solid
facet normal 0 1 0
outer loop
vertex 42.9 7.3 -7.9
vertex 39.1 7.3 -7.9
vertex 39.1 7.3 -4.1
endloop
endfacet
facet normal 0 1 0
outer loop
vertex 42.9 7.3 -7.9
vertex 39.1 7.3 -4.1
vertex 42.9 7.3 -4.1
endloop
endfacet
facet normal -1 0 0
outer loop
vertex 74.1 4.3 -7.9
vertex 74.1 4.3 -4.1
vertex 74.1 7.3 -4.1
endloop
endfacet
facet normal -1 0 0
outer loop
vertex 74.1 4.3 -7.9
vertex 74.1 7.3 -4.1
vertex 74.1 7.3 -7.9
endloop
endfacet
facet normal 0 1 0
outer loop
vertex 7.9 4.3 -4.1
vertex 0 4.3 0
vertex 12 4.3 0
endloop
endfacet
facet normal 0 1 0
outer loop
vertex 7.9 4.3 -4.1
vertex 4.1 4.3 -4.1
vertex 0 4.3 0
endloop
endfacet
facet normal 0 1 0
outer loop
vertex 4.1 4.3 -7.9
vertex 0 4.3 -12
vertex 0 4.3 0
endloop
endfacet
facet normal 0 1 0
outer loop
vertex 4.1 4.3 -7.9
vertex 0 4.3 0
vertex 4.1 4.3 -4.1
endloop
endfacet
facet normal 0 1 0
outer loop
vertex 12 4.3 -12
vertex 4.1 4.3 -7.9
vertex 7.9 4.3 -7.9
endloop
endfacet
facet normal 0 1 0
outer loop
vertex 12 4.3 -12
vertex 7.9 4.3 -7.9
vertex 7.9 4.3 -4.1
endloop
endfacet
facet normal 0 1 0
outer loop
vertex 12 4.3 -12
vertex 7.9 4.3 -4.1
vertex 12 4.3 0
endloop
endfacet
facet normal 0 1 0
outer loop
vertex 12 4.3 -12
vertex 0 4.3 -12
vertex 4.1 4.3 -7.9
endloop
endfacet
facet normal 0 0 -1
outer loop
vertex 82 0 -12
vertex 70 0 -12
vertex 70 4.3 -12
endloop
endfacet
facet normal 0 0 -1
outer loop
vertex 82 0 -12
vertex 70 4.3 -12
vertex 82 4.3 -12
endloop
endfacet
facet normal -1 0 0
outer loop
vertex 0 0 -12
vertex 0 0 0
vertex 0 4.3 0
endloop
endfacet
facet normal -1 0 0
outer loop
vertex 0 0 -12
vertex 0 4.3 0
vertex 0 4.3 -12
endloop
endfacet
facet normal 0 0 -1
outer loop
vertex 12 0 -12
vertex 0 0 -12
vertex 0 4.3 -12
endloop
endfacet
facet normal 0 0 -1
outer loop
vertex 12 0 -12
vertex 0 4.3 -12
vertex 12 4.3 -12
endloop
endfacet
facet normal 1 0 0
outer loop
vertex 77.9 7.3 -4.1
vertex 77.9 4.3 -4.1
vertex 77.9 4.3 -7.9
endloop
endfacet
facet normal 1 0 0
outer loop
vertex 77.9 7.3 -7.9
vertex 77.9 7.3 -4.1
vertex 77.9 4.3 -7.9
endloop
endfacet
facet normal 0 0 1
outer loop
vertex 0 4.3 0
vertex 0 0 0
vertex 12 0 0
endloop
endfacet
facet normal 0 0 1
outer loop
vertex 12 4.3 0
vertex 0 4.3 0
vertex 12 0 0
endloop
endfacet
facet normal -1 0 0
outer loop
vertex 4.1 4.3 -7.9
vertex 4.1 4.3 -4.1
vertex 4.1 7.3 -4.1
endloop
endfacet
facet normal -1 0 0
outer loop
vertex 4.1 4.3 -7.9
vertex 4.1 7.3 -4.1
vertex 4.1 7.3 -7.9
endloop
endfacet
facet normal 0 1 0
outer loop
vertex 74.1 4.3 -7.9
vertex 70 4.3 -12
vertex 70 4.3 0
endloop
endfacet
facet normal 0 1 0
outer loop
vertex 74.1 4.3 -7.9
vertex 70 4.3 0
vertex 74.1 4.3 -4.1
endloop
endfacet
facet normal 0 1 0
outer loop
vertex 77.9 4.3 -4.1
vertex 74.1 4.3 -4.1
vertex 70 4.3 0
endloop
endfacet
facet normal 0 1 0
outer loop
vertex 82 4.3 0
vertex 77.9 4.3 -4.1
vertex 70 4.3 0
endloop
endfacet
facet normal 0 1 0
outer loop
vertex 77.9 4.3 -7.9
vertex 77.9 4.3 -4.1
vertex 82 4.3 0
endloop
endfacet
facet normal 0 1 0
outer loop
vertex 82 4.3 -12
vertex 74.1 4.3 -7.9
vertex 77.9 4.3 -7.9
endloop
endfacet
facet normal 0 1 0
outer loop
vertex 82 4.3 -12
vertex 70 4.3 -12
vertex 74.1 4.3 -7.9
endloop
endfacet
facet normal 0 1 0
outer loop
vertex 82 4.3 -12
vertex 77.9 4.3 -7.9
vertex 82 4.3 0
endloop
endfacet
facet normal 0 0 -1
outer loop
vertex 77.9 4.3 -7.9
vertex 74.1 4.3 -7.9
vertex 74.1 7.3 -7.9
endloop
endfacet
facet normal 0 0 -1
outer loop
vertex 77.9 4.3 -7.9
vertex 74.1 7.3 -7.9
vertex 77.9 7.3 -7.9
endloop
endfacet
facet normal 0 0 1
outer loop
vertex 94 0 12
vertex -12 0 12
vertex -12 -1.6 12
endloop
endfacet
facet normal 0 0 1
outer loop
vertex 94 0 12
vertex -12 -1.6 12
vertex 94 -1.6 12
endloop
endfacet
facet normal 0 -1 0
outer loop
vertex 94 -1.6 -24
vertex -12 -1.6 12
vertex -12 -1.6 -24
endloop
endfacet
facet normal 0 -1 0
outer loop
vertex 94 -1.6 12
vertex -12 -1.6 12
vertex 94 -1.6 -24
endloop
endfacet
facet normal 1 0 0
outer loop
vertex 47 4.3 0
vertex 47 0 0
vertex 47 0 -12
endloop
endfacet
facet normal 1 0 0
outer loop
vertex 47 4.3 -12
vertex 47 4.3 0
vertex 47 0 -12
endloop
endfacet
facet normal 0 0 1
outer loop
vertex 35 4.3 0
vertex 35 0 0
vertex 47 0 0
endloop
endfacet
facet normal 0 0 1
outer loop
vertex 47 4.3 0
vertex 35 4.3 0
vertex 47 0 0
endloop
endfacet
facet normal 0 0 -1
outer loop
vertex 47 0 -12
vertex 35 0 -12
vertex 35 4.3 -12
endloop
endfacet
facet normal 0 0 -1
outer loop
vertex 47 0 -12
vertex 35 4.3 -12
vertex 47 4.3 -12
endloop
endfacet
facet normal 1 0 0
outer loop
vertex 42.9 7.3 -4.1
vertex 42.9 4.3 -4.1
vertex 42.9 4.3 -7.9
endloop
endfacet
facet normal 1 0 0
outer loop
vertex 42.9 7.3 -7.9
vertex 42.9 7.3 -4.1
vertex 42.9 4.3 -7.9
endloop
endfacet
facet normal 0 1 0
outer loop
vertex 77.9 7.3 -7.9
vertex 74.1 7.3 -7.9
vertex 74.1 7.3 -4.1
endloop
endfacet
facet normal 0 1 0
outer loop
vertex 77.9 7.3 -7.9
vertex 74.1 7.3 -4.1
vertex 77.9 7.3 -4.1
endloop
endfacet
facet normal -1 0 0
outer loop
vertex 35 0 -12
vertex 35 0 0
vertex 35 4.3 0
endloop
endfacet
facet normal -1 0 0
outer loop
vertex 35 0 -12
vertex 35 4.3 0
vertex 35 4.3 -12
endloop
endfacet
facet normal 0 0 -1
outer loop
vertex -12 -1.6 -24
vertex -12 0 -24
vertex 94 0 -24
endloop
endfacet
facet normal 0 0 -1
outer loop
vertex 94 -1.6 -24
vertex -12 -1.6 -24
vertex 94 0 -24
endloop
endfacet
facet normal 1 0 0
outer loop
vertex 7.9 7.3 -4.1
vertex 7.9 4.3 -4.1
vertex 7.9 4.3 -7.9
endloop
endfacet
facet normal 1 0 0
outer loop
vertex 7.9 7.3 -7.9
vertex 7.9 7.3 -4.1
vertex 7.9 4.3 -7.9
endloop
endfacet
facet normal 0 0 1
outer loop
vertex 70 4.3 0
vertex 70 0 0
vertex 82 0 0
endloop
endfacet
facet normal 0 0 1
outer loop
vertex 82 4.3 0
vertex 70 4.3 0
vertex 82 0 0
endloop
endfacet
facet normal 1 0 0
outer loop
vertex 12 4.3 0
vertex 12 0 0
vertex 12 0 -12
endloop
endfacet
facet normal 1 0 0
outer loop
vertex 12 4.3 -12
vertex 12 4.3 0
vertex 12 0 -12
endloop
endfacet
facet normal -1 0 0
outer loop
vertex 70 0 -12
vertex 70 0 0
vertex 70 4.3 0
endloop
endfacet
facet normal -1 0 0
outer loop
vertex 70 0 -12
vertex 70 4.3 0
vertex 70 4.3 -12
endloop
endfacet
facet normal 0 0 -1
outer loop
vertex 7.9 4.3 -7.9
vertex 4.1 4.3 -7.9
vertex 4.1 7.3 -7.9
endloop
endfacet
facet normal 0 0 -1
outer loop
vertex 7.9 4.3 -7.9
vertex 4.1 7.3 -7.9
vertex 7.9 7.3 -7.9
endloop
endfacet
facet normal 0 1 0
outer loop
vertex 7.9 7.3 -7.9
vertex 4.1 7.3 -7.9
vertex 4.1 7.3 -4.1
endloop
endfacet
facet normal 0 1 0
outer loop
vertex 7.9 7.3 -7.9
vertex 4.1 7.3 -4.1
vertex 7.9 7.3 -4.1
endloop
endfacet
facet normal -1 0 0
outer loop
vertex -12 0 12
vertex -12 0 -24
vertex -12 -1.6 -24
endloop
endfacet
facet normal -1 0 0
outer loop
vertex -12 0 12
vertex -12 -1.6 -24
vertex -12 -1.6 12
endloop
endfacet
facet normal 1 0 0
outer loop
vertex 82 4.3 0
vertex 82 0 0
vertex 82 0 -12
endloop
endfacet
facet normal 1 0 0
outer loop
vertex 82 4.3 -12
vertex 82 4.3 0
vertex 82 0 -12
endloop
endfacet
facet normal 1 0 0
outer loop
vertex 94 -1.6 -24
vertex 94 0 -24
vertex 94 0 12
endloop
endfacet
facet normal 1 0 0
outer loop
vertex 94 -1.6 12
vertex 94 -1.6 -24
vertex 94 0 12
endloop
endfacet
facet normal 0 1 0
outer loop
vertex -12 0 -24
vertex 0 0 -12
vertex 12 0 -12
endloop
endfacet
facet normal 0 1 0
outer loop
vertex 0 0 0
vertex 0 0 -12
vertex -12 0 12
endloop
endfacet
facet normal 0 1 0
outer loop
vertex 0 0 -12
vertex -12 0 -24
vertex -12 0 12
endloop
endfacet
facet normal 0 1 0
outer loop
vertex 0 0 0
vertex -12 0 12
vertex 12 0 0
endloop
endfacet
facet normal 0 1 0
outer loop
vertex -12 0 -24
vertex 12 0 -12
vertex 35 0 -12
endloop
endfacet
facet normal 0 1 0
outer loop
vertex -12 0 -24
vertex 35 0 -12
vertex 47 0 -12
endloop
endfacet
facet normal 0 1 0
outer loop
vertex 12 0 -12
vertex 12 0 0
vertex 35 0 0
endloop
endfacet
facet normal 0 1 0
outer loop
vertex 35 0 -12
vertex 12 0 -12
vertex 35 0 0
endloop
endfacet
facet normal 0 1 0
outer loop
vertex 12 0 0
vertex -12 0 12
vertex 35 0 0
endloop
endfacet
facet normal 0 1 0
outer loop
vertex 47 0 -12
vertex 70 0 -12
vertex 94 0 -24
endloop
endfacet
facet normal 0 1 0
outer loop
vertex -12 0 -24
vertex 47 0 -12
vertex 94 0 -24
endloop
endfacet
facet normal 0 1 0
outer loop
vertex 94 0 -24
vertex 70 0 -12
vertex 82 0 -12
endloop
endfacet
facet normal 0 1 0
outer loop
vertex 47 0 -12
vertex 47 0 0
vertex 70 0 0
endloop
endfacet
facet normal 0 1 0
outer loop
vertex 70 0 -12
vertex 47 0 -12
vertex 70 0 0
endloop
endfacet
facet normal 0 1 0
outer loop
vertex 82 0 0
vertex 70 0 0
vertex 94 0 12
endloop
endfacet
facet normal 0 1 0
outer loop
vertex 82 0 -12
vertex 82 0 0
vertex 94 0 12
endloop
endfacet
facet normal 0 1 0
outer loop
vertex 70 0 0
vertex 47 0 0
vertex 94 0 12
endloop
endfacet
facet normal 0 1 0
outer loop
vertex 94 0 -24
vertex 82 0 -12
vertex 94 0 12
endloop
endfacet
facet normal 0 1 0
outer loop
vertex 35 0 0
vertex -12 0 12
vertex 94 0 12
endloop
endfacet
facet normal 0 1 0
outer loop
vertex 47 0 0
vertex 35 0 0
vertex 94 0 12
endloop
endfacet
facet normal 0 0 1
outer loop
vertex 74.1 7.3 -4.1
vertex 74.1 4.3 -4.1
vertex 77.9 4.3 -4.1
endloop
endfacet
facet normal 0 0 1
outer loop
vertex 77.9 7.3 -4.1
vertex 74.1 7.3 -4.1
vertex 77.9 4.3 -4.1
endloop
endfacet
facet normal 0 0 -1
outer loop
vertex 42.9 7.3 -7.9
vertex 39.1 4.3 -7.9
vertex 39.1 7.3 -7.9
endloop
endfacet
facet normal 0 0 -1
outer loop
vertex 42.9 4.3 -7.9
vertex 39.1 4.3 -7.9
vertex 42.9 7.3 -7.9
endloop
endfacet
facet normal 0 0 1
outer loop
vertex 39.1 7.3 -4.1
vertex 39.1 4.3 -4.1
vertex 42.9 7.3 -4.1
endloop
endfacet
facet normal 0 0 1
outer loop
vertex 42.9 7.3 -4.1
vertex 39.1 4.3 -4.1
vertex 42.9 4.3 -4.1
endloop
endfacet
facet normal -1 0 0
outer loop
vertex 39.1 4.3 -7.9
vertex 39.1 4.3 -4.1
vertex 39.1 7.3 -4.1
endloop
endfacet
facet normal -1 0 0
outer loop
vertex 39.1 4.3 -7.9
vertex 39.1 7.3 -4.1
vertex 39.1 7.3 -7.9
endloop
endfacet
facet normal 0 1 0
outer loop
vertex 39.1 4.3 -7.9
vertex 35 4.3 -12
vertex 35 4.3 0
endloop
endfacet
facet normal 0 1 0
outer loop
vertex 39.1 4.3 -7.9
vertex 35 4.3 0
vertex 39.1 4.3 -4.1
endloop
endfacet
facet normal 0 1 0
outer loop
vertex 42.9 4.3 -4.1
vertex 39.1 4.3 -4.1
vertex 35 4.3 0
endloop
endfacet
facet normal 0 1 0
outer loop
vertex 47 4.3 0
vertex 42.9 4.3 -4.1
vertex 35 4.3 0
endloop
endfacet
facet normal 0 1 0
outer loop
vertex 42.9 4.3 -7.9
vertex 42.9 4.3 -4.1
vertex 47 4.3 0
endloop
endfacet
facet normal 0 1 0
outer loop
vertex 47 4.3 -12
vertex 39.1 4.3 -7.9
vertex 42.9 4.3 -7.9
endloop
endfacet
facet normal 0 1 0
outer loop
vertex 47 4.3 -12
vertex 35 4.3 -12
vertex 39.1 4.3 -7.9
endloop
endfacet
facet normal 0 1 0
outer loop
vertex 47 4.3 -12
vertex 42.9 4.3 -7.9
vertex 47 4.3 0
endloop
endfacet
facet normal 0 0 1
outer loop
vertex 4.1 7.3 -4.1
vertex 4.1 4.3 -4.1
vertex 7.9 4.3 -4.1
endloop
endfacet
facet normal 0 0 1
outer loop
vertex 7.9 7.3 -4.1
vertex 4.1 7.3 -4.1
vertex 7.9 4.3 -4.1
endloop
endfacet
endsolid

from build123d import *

# Parameters (mm, degrees)
SKETCH1_W           = 12
SKETCH1_H           = 12
BOSS_EXTRUDE1_DEPTH = 4.3
SKETCH2_W           = 3.8
SKETCH2_H           = 3.8
BOSS_EXTRUDE2_DEPTH = 3
SKETCH3_W           = 106
SKETCH3_H           = 36
BOSS_EXTRUDE3_DEPTH = 1.6
SKETCH4_W           = 12
SKETCH4_H           = 12
BOSS_EXTRUDE4_DEPTH = 4.3
SKETCH5_W           = 3.8
SKETCH5_H           = 3.8
BOSS_EXTRUDE5_DEPTH = 3


with BuildPart() as part:
    # Sketch1 → Boss-Extrude1 (new body)
    with BuildSketch(Plane(origin=(0, 0, 0), x_dir=(1, 0, 0), z_dir=(0, 1, 0))):
        with Locations((6, 6)):
            Rectangle(SKETCH1_W, SKETCH1_H)
    extrude(amount=BOSS_EXTRUDE1_DEPTH)

    # Sketch2 → Boss-Extrude2 (add)
    with BuildSketch(Plane(origin=(0, 4.3, 0), x_dir=(1, 0, 0), z_dir=(0, 1, 0))):
        with Locations((6, 6)):
            Rectangle(SKETCH2_W, SKETCH2_H)
    extrude(amount=BOSS_EXTRUDE2_DEPTH)

    # Sketch3 → Boss-Extrude3 (add)
    with BuildSketch(Plane.XZ):
        with Locations((41, -6)):
            Rectangle(SKETCH3_W, SKETCH3_H)
    extrude(amount=BOSS_EXTRUDE3_DEPTH)

    # Sketch4 → Boss-Extrude4 (add)
    with BuildSketch(Plane(origin=(0, 0, 0), x_dir=(1, 0, 0), z_dir=(0, 1, 0))):
        with Locations((41, 6)):
            Rectangle(SKETCH4_W, SKETCH4_H)
        with Locations((76, 6)):
            Rectangle(SKETCH4_W, SKETCH4_H)
    extrude(amount=BOSS_EXTRUDE4_DEPTH)

    # Sketch5 → Boss-Extrude5 (add)
    with BuildSketch(Plane(origin=(0, 4.3, 0), x_dir=(1, 0, 0), z_dir=(0, 1, 0))):
        with Locations((41, 6)):
            Rectangle(SKETCH5_W, SKETCH5_H)
        with Locations((76, 6)):
            Rectangle(SKETCH5_W, SKETCH5_H)
    extrude(amount=BOSS_EXTRUDE5_DEPTH)


solid = part.part
